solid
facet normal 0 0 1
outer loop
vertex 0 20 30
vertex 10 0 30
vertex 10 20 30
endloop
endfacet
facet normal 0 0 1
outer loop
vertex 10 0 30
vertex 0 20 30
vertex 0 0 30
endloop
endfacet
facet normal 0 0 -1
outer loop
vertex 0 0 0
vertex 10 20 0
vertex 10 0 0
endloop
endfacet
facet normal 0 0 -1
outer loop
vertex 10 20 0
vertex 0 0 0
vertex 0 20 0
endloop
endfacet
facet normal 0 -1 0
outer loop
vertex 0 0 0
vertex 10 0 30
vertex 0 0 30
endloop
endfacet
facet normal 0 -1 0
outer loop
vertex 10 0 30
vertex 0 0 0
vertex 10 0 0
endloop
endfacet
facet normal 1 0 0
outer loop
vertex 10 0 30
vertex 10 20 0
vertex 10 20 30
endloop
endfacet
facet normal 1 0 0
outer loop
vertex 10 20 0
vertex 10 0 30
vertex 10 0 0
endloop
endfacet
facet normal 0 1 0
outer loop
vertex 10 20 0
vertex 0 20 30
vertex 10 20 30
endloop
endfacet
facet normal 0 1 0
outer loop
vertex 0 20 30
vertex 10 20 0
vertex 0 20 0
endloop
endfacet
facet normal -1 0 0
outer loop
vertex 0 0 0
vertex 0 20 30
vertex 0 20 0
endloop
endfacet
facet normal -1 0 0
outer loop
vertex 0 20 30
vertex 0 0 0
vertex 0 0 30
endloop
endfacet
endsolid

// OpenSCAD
// Baseline for the STEP exporter: a single closed body without holes.
// Guards the vertex and edge sharing - every edge of the shell has to be used
// by exactly two faces, once in each direction.
//
// Measured, and asserted by the driver: what the exporter has to report for
// the above to have happened. A silently faceted export is still a valid one,
// so validity alone cannot see a recogniser that has stopped recognising.
// Nothing *curved* is declared, which is the assertion: there is no recogniser
// work to do here, so a recogniser that stopped working could not hide behind
// this fixture. The six planes are the box's own faces, which cube() states
// since PlaneSurface existed - a flat face is a thing a model can mean, and the
// corner placement needs to tell one from a chord of some tessellation. Six of
// them for six faces, and they are counted apart from the curved surfaces
// because nothing is ever recognised *onto* a plane.
// EXPECT: 0 analytic surfaces available (0 cylindrical, 0 spherical, 0 toroidal, 0 Bezier), and 6 declared planes
//
// A box, so the volume is the box: 10*20*30 = 6000, and it is here because a
// fixture whose answer is arithmetic anyone can do is the one that proves the
// check itself works.
// ROUNDTRIP: Plane=6
// VOLUME: 6000
cube([10, 20, 30]);
